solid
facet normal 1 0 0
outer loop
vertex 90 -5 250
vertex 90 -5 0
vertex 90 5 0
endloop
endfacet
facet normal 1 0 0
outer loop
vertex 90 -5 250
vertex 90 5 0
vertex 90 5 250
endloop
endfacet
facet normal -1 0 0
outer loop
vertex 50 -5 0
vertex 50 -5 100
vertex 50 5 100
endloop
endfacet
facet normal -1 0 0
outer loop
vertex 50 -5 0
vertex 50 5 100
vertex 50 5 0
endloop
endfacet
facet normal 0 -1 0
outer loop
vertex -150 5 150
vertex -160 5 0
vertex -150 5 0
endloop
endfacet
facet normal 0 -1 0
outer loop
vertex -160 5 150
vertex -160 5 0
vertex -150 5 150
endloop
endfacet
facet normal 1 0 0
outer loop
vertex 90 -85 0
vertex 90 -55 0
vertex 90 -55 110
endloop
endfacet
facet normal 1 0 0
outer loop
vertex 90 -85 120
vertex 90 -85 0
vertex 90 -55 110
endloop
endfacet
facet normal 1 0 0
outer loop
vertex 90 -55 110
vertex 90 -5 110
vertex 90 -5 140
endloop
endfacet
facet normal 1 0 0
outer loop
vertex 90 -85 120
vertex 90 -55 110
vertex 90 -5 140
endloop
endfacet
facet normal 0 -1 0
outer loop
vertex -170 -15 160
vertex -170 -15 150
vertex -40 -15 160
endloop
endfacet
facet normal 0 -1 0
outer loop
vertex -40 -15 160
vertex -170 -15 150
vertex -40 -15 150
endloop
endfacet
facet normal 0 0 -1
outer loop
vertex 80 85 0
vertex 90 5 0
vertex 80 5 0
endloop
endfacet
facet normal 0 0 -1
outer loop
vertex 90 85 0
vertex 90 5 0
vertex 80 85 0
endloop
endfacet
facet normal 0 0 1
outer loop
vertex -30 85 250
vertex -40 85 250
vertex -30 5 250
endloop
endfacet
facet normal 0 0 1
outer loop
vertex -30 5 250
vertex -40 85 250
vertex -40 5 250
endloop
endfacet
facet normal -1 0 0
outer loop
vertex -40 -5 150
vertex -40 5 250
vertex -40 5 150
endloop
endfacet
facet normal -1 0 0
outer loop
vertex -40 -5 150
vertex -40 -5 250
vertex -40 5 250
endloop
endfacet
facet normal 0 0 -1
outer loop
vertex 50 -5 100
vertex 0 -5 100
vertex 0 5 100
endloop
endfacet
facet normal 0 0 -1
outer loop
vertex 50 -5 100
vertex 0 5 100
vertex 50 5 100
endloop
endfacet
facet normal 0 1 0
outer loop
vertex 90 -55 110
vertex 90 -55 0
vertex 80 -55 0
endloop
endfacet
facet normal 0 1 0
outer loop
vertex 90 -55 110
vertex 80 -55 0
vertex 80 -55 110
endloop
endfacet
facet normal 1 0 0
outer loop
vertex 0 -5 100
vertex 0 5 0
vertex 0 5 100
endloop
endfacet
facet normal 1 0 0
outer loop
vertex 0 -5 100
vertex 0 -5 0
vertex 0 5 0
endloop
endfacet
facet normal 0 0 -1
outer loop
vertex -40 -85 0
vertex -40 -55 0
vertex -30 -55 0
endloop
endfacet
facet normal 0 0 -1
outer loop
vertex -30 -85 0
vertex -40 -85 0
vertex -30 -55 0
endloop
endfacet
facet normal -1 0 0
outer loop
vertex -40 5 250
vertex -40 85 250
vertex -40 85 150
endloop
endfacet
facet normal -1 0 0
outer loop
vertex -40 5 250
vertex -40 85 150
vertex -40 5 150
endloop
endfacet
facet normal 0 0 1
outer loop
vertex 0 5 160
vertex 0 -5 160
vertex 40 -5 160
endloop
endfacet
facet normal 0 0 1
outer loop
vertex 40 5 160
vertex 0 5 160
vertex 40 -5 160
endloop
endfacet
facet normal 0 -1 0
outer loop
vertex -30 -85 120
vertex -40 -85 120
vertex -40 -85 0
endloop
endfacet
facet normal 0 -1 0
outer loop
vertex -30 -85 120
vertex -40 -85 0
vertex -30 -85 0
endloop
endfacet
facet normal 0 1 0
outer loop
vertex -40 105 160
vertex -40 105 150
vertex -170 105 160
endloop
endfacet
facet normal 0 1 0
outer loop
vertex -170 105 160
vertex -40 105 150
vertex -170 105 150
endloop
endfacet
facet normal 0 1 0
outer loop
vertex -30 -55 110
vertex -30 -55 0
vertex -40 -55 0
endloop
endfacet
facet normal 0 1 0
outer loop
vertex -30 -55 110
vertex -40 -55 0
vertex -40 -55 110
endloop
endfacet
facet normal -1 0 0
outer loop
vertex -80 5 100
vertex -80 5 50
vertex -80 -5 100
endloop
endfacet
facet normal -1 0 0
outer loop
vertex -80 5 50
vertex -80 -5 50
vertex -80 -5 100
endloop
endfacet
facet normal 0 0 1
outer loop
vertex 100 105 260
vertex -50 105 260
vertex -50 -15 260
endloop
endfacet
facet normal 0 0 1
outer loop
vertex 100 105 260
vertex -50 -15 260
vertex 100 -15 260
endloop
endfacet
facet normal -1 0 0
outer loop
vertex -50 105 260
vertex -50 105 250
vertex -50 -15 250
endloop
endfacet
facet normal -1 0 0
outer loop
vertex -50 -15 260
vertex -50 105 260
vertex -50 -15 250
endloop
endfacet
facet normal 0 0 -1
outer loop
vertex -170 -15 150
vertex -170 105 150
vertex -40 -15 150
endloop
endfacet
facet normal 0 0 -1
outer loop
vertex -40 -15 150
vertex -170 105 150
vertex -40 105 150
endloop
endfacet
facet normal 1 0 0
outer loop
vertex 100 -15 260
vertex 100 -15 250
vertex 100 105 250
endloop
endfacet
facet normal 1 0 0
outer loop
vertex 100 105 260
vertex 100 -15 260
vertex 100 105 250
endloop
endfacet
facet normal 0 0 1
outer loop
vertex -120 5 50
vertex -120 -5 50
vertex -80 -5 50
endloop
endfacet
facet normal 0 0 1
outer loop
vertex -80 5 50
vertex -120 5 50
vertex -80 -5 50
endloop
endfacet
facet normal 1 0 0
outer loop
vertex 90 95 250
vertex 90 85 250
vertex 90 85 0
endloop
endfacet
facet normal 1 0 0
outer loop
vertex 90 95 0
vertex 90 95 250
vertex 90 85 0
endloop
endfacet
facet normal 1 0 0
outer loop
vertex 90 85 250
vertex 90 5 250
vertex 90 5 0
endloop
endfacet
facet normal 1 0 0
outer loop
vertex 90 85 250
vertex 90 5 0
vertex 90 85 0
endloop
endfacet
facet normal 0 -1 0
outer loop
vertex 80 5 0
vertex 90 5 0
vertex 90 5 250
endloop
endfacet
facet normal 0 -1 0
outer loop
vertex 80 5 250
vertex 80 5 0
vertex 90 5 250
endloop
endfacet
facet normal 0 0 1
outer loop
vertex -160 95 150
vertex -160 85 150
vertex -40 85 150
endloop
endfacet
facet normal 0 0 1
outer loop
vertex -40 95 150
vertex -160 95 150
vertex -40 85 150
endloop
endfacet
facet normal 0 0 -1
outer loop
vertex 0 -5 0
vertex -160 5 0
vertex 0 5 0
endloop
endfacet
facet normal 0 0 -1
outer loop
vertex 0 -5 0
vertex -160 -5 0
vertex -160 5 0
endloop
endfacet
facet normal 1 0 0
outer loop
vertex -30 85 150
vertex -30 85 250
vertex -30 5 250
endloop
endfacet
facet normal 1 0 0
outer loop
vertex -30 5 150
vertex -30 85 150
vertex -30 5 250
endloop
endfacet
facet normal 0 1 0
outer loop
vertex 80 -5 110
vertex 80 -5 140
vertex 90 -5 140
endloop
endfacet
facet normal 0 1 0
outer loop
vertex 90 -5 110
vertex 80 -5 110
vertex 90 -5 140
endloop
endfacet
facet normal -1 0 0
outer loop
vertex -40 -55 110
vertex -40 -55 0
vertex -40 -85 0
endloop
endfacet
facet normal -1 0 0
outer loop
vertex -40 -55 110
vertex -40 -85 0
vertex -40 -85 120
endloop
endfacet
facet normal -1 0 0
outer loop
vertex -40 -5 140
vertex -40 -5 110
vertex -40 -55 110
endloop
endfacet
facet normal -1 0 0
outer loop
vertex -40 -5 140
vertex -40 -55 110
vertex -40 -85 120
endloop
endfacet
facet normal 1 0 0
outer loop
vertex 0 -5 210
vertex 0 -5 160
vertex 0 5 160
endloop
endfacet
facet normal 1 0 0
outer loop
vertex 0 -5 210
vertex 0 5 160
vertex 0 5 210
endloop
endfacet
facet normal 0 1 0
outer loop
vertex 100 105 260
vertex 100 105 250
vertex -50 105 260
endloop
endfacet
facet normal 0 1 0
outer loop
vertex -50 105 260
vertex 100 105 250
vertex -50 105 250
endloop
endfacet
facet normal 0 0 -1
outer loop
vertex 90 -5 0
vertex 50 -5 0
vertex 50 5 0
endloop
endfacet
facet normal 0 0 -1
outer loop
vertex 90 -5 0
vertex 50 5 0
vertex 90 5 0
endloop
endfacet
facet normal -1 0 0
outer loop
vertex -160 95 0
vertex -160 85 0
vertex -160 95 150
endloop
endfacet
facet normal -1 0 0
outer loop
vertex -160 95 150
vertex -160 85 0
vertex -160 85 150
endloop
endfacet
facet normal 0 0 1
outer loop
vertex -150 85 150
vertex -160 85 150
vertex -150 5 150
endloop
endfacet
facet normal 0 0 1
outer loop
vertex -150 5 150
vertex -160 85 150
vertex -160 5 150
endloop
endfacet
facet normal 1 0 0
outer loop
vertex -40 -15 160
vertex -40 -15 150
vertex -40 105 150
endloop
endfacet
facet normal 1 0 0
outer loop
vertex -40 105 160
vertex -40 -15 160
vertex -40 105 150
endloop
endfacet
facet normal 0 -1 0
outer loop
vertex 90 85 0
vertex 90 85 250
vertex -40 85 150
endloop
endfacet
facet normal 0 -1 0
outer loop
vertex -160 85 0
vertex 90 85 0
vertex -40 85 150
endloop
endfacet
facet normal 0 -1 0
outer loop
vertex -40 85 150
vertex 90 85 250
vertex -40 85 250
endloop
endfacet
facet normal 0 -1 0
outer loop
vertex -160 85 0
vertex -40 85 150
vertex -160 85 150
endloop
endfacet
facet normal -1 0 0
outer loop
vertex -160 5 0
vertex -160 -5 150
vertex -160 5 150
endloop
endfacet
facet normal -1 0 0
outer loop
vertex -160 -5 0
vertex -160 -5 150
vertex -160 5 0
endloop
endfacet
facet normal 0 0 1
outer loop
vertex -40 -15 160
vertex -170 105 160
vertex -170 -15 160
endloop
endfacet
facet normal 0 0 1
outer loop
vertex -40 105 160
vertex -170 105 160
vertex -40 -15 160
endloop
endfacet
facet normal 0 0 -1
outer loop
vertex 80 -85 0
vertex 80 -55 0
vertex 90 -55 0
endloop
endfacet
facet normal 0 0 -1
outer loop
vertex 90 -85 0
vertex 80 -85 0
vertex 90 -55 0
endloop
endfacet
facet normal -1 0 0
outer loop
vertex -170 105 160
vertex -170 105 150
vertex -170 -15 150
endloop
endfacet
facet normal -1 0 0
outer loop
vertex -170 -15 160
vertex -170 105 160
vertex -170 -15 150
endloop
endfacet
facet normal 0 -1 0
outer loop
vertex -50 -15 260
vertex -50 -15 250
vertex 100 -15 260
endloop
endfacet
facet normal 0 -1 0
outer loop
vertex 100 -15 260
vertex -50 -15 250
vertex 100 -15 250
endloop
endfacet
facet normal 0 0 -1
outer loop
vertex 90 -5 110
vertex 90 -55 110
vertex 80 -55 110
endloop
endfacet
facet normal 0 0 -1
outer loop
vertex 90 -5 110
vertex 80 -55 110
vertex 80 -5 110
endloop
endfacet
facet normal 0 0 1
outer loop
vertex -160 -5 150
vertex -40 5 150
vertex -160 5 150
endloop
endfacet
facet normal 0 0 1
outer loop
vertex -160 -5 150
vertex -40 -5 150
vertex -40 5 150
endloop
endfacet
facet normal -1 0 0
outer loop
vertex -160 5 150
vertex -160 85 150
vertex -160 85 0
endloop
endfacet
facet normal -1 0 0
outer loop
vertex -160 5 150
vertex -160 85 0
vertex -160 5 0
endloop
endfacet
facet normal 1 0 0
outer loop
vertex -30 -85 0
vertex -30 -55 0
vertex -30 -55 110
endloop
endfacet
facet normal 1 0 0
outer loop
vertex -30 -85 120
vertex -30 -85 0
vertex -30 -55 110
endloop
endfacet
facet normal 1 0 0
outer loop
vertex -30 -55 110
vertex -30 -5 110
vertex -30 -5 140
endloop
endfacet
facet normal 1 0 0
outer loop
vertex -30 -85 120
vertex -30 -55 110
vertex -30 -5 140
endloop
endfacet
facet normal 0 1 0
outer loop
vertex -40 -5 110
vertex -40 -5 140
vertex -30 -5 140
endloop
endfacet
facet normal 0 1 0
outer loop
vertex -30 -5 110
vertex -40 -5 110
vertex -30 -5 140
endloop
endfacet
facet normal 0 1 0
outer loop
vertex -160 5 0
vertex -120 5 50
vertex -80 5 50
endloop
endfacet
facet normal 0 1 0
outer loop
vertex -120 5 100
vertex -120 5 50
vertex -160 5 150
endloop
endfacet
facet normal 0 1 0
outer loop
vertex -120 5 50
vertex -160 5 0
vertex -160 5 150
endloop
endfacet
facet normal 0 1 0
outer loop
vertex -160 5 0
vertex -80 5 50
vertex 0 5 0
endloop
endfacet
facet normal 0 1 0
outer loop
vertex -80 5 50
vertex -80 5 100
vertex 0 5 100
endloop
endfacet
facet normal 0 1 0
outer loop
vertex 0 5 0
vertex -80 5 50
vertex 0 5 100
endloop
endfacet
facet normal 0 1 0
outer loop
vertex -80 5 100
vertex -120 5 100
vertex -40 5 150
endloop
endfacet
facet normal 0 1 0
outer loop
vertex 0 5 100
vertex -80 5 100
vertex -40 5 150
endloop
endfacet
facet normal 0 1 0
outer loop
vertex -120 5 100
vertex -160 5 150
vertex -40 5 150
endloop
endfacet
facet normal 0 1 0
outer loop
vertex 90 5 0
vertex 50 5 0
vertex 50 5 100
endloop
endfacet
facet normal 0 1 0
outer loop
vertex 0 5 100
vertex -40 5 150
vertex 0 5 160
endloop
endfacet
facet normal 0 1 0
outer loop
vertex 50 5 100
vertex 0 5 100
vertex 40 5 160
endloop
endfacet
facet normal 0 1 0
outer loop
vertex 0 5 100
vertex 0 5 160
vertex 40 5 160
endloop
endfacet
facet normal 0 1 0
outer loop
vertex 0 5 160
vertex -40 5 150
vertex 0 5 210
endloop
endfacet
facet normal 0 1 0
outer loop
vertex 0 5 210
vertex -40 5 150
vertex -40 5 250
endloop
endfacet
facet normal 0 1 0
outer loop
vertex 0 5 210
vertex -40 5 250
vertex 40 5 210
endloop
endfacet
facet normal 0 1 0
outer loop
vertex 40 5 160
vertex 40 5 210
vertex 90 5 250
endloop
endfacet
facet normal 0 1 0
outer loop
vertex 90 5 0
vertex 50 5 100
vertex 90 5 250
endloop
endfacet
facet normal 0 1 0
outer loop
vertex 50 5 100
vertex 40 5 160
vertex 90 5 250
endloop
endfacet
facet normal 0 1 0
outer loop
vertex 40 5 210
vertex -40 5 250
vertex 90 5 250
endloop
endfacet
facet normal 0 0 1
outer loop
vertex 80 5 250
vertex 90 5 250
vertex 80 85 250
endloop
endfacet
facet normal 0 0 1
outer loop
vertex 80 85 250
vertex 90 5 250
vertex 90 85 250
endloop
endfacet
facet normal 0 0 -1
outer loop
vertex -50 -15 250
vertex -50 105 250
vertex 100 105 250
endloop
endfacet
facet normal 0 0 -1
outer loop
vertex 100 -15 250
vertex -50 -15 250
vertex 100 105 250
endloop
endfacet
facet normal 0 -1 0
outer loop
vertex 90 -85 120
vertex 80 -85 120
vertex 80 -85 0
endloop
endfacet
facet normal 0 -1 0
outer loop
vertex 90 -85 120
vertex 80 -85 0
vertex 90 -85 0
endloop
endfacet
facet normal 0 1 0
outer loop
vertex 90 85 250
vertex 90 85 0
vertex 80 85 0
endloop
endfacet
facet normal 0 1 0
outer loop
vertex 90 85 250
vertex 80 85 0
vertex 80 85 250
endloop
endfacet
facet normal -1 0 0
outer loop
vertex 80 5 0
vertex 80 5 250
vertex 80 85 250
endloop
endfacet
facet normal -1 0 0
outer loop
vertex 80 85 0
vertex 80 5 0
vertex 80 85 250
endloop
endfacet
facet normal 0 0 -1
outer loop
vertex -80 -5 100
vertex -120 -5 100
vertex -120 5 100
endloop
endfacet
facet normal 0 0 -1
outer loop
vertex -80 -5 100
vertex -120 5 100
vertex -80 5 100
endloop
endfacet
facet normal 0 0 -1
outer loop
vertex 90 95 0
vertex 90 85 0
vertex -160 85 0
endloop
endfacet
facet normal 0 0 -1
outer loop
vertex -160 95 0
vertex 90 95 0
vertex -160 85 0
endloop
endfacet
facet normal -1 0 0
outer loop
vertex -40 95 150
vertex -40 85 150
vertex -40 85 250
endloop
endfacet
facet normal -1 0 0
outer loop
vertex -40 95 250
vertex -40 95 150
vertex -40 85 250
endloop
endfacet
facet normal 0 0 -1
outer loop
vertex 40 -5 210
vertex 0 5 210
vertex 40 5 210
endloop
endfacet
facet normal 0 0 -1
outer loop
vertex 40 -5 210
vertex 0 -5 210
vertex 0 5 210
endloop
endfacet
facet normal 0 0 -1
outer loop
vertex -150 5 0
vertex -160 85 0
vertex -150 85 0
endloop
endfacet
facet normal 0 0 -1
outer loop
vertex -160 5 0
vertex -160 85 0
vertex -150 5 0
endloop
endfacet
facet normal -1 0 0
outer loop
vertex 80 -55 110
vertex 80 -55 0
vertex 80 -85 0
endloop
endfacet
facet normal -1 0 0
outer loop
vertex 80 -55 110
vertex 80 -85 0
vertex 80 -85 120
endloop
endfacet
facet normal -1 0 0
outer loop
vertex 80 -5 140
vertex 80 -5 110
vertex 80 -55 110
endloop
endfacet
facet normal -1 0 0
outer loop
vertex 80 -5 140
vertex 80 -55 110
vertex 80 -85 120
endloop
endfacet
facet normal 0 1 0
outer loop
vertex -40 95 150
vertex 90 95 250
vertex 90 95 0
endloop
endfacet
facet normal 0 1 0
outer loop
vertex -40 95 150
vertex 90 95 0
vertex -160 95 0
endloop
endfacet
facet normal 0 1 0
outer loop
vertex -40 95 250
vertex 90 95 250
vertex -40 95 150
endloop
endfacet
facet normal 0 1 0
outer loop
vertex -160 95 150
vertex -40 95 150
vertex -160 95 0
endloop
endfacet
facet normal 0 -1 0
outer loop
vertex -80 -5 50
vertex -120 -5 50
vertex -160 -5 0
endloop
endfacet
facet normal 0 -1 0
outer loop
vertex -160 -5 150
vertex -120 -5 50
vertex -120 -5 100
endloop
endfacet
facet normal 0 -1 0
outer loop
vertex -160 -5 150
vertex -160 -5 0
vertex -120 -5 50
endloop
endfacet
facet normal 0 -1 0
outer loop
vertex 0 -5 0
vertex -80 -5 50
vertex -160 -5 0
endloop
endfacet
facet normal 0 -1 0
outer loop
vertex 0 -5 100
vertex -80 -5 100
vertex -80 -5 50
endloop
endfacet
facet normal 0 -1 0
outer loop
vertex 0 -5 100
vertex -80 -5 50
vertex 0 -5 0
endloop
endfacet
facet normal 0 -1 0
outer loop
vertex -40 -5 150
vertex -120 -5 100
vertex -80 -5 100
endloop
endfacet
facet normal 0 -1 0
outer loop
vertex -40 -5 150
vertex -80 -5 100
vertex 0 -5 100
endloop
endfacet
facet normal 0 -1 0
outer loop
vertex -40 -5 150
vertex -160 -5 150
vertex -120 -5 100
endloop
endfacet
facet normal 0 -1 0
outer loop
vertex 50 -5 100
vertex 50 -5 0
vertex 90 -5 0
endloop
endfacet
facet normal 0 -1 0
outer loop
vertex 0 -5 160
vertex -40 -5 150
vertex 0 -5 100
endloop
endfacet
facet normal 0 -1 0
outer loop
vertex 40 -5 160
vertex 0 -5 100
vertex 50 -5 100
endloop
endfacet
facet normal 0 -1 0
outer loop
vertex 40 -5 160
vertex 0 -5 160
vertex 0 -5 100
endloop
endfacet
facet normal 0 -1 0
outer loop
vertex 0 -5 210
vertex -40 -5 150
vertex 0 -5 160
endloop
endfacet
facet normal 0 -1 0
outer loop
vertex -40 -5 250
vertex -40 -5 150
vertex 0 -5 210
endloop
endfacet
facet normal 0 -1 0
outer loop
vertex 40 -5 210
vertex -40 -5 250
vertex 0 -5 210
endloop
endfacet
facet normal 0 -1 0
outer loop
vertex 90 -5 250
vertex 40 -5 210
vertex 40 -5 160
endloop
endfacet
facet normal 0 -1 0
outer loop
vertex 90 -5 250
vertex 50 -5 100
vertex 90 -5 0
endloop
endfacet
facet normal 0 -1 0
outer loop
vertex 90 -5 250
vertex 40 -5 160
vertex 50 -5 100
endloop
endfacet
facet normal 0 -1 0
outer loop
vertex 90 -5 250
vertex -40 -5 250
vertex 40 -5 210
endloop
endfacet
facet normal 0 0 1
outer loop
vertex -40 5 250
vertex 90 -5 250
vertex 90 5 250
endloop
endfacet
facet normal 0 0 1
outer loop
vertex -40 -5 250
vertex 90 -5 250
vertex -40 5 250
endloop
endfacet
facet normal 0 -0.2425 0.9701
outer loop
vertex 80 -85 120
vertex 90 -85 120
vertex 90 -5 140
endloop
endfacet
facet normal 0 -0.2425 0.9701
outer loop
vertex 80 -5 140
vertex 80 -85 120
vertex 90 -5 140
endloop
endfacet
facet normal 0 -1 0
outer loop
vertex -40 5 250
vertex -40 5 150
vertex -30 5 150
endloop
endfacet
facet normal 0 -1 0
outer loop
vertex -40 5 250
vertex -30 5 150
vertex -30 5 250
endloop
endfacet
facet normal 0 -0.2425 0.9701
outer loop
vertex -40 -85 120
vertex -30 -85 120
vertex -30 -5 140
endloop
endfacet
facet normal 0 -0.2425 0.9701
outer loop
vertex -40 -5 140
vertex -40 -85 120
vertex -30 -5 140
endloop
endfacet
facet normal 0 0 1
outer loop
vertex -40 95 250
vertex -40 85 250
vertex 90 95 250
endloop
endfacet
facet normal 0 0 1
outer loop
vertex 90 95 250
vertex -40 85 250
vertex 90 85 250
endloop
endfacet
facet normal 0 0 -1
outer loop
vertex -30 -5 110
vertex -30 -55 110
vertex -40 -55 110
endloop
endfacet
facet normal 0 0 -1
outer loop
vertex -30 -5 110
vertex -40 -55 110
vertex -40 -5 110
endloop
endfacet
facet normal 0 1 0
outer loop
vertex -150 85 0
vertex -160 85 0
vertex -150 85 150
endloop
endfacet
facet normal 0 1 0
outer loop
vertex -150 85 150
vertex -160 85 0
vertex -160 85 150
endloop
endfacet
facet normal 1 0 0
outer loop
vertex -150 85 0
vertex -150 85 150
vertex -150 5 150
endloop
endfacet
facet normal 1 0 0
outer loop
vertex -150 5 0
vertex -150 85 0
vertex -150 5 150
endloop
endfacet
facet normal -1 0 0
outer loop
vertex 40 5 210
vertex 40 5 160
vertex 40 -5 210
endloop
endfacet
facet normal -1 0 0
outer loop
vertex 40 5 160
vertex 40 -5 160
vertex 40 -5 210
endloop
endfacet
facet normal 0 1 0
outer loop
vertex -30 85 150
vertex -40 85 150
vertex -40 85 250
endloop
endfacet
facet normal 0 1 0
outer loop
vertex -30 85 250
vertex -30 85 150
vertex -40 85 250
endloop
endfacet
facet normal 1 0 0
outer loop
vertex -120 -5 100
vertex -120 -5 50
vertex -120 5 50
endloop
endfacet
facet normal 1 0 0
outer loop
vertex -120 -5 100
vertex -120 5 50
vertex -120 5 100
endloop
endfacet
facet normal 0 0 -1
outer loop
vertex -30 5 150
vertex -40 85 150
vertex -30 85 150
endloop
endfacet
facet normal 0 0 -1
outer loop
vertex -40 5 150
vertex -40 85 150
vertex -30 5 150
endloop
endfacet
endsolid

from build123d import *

# Parameters (mm, degrees)
F0_W      = 40
F0_H      = 50
F1_DEPTH  = 5
F4_DEPTH  = 10
F5_W      = 80
F5_H      = 250
F6_DEPTH  = 10
F7_W      = 80
F7_H      = 150
F8_DEPTH  = 10
F9_W      = 80
F9_H      = 100
F10_DEPTH = 10
F12_DEPTH = 10
F14_DEPTH = 10
F15_W     = 10
F15_H     = 140
F16_DEPTH = 80
F17_W     = 50
F17_H     = 110
F18_DEPTH = 130


with BuildPart() as f1:
    # F0 (on Front) → F1 (new body, symmetric)
    with BuildSketch(Plane.XZ):
        Polygon((0, 0), (0, 100), (50, 100), (50, 0), (90, 0), (90, 250), (-40, 250), (-40, 150), (-160, 150), (-160, 0), align=None)
        with Locations((-100, 75)):
            Rectangle(F0_W, F0_H, mode=Mode.SUBTRACT)
        with Locations((20, 185)):
            Rectangle(F0_W, F0_H, mode=Mode.SUBTRACT)
    extrude(amount=F1_DEPTH, both=True)


with BuildPart() as f4:
    # F3 (on offset) → F4 (new body)
    with BuildSketch(Plane(origin=(0, 85, 0), x_dir=(-1, 0, 0), z_dir=(0, 1, 0))):
        Polygon((-90, 250), (-90, 0), (-50, 0), (0, 0), (160, 0), (160, 150), (40, 150), (40, 250), align=None)
    extrude(amount=F4_DEPTH)


with BuildPart() as f6:
    # F5 (on face) → F6 (new body)
    with BuildSketch(Plane.YZ.offset(90)):
        with Locations((45, 125)):
            Rectangle(F5_W, F5_H)
    extrude(amount=-F6_DEPTH)


with BuildPart() as f8:
    # F7 (on face) → F8 (new body)
    with BuildSketch(Plane(origin=(-160, 0, 0), x_dir=(0, -1, 0), z_dir=(-1, 0, 0))):
        with Locations((-45, 75)):
            Rectangle(F7_W, F7_H)
    extrude(amount=-F8_DEPTH)


with BuildPart() as f10:
    # F9 (on face) → F10 (new body)
    with BuildSketch(Plane(origin=(-40, 0, 0), x_dir=(0, -1, 0), z_dir=(-1, 0, 0))):
        with Locations((-45, 200)):
            Rectangle(F9_W, F9_H)
    extrude(amount=-F10_DEPTH)


with BuildPart() as f12:
    # F11 (on face) → F12 (new body)
    with BuildSketch(Plane.XY.offset(150)):
        Polygon((-40, 105), (-170, 105), (-170, 85), (-170, 5), (-170, -15), (-40, -15), align=None)
    extrude(amount=F12_DEPTH)


with BuildPart() as f14:
    # F13 (on face) → F14 (new body)
    with BuildSketch(Plane.XY.offset(250)):
        Polygon((100, 105), (-50, 105), (-50, 85), (-50, 5), (-50, -15), (100, -15), (100, 5), (100, 85), align=None)
    extrude(amount=F14_DEPTH)


with BuildPart() as f16:
    # F15 (on face) → F16 (new body)
    with BuildSketch(Plane.XZ.offset(5)):
        with Locations((-35, 70)):
            Rectangle(F15_W, F15_H)
    extrude(amount=F16_DEPTH)


with BuildPart() as f16b:
    # F15 (on face) → F16, piece 2 (new body)
    with BuildSketch(Plane.XZ.offset(5)):
        with Locations((85, 70)):
            Rectangle(F15_W, F15_H)
    extrude(amount=F16_DEPTH)


with BuildPart() as f18_tool:
    # F17 (on face) → F18 (new body, through all)
    with BuildSketch(Plane.YZ.offset(90)):
        Polygon((-85, 120), (-5, 140), (-85, 140), align=None)
        with Locations((-30, 55)):
            Rectangle(F17_W, F17_H)
    extrude(amount=-F18_DEPTH)


with BuildPart() as f16_1:
    add(f16.part)

    # F18: cut by f18_tool
    add(f18_tool.part, mode=Mode.SUBTRACT)


with BuildPart() as f16b_1:
    add(f16b.part)

    # F18: cut by f18_tool
    add(f18_tool.part, mode=Mode.SUBTRACT)


solid = Compound([f1.part, f4.part, f6.part, f8.part, f10.part, f12.part, f14.part, f16_1.part, f16b_1.part])
